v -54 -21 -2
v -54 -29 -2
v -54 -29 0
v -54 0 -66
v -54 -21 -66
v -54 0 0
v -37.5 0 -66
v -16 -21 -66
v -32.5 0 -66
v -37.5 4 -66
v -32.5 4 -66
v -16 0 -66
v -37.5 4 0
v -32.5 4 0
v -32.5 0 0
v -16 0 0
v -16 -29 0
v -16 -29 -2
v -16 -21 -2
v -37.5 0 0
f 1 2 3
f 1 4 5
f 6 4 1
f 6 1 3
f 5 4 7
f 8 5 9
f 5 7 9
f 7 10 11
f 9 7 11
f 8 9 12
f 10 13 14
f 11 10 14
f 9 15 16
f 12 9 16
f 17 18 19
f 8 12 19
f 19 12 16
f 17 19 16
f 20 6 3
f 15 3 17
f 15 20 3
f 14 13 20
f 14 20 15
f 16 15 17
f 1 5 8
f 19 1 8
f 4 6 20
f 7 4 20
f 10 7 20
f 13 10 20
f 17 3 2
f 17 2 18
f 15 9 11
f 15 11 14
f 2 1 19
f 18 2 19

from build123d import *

# Parameters (mm, degrees)
F0_W     = 5
F0_H     = 66
F0_W_2   = 16.5
F1_DEPTH = 21
F2_DEPTH = 4
F3_W     = 38
F3_H     = 2
F4_DEPTH = 8


# Not quite as in the source:
# - a feature names something its author has since deleted; it is built from what else it names


with BuildPart() as f1:
    # F0 (on Front) → F1 (new body)
    with BuildSketch(Plane.XZ):
        with Locations((-35, -33)):
            Rectangle(F0_W, F0_H)
        with Locations((-45.75, -33)):
            Rectangle(F0_W_2, F0_H)
        with Locations((-24.25, -33)):
            Rectangle(F0_W_2, F0_H)
    extrude(amount=F1_DEPTH)

    # F0 (on Front) → F2 (join)
    with BuildSketch(Plane.XZ):
        with Locations((-35, -33)):
            Rectangle(F0_W, F0_H)
    extrude(amount=-F2_DEPTH)

    # F3 (on face) → F4 (join)
    with BuildSketch(Plane.XZ.offset(21)):
        with Locations((-35, -1)):
            Rectangle(F3_W, F3_H)
    extrude(amount=F4_DEPTH)


solid = f1.part
